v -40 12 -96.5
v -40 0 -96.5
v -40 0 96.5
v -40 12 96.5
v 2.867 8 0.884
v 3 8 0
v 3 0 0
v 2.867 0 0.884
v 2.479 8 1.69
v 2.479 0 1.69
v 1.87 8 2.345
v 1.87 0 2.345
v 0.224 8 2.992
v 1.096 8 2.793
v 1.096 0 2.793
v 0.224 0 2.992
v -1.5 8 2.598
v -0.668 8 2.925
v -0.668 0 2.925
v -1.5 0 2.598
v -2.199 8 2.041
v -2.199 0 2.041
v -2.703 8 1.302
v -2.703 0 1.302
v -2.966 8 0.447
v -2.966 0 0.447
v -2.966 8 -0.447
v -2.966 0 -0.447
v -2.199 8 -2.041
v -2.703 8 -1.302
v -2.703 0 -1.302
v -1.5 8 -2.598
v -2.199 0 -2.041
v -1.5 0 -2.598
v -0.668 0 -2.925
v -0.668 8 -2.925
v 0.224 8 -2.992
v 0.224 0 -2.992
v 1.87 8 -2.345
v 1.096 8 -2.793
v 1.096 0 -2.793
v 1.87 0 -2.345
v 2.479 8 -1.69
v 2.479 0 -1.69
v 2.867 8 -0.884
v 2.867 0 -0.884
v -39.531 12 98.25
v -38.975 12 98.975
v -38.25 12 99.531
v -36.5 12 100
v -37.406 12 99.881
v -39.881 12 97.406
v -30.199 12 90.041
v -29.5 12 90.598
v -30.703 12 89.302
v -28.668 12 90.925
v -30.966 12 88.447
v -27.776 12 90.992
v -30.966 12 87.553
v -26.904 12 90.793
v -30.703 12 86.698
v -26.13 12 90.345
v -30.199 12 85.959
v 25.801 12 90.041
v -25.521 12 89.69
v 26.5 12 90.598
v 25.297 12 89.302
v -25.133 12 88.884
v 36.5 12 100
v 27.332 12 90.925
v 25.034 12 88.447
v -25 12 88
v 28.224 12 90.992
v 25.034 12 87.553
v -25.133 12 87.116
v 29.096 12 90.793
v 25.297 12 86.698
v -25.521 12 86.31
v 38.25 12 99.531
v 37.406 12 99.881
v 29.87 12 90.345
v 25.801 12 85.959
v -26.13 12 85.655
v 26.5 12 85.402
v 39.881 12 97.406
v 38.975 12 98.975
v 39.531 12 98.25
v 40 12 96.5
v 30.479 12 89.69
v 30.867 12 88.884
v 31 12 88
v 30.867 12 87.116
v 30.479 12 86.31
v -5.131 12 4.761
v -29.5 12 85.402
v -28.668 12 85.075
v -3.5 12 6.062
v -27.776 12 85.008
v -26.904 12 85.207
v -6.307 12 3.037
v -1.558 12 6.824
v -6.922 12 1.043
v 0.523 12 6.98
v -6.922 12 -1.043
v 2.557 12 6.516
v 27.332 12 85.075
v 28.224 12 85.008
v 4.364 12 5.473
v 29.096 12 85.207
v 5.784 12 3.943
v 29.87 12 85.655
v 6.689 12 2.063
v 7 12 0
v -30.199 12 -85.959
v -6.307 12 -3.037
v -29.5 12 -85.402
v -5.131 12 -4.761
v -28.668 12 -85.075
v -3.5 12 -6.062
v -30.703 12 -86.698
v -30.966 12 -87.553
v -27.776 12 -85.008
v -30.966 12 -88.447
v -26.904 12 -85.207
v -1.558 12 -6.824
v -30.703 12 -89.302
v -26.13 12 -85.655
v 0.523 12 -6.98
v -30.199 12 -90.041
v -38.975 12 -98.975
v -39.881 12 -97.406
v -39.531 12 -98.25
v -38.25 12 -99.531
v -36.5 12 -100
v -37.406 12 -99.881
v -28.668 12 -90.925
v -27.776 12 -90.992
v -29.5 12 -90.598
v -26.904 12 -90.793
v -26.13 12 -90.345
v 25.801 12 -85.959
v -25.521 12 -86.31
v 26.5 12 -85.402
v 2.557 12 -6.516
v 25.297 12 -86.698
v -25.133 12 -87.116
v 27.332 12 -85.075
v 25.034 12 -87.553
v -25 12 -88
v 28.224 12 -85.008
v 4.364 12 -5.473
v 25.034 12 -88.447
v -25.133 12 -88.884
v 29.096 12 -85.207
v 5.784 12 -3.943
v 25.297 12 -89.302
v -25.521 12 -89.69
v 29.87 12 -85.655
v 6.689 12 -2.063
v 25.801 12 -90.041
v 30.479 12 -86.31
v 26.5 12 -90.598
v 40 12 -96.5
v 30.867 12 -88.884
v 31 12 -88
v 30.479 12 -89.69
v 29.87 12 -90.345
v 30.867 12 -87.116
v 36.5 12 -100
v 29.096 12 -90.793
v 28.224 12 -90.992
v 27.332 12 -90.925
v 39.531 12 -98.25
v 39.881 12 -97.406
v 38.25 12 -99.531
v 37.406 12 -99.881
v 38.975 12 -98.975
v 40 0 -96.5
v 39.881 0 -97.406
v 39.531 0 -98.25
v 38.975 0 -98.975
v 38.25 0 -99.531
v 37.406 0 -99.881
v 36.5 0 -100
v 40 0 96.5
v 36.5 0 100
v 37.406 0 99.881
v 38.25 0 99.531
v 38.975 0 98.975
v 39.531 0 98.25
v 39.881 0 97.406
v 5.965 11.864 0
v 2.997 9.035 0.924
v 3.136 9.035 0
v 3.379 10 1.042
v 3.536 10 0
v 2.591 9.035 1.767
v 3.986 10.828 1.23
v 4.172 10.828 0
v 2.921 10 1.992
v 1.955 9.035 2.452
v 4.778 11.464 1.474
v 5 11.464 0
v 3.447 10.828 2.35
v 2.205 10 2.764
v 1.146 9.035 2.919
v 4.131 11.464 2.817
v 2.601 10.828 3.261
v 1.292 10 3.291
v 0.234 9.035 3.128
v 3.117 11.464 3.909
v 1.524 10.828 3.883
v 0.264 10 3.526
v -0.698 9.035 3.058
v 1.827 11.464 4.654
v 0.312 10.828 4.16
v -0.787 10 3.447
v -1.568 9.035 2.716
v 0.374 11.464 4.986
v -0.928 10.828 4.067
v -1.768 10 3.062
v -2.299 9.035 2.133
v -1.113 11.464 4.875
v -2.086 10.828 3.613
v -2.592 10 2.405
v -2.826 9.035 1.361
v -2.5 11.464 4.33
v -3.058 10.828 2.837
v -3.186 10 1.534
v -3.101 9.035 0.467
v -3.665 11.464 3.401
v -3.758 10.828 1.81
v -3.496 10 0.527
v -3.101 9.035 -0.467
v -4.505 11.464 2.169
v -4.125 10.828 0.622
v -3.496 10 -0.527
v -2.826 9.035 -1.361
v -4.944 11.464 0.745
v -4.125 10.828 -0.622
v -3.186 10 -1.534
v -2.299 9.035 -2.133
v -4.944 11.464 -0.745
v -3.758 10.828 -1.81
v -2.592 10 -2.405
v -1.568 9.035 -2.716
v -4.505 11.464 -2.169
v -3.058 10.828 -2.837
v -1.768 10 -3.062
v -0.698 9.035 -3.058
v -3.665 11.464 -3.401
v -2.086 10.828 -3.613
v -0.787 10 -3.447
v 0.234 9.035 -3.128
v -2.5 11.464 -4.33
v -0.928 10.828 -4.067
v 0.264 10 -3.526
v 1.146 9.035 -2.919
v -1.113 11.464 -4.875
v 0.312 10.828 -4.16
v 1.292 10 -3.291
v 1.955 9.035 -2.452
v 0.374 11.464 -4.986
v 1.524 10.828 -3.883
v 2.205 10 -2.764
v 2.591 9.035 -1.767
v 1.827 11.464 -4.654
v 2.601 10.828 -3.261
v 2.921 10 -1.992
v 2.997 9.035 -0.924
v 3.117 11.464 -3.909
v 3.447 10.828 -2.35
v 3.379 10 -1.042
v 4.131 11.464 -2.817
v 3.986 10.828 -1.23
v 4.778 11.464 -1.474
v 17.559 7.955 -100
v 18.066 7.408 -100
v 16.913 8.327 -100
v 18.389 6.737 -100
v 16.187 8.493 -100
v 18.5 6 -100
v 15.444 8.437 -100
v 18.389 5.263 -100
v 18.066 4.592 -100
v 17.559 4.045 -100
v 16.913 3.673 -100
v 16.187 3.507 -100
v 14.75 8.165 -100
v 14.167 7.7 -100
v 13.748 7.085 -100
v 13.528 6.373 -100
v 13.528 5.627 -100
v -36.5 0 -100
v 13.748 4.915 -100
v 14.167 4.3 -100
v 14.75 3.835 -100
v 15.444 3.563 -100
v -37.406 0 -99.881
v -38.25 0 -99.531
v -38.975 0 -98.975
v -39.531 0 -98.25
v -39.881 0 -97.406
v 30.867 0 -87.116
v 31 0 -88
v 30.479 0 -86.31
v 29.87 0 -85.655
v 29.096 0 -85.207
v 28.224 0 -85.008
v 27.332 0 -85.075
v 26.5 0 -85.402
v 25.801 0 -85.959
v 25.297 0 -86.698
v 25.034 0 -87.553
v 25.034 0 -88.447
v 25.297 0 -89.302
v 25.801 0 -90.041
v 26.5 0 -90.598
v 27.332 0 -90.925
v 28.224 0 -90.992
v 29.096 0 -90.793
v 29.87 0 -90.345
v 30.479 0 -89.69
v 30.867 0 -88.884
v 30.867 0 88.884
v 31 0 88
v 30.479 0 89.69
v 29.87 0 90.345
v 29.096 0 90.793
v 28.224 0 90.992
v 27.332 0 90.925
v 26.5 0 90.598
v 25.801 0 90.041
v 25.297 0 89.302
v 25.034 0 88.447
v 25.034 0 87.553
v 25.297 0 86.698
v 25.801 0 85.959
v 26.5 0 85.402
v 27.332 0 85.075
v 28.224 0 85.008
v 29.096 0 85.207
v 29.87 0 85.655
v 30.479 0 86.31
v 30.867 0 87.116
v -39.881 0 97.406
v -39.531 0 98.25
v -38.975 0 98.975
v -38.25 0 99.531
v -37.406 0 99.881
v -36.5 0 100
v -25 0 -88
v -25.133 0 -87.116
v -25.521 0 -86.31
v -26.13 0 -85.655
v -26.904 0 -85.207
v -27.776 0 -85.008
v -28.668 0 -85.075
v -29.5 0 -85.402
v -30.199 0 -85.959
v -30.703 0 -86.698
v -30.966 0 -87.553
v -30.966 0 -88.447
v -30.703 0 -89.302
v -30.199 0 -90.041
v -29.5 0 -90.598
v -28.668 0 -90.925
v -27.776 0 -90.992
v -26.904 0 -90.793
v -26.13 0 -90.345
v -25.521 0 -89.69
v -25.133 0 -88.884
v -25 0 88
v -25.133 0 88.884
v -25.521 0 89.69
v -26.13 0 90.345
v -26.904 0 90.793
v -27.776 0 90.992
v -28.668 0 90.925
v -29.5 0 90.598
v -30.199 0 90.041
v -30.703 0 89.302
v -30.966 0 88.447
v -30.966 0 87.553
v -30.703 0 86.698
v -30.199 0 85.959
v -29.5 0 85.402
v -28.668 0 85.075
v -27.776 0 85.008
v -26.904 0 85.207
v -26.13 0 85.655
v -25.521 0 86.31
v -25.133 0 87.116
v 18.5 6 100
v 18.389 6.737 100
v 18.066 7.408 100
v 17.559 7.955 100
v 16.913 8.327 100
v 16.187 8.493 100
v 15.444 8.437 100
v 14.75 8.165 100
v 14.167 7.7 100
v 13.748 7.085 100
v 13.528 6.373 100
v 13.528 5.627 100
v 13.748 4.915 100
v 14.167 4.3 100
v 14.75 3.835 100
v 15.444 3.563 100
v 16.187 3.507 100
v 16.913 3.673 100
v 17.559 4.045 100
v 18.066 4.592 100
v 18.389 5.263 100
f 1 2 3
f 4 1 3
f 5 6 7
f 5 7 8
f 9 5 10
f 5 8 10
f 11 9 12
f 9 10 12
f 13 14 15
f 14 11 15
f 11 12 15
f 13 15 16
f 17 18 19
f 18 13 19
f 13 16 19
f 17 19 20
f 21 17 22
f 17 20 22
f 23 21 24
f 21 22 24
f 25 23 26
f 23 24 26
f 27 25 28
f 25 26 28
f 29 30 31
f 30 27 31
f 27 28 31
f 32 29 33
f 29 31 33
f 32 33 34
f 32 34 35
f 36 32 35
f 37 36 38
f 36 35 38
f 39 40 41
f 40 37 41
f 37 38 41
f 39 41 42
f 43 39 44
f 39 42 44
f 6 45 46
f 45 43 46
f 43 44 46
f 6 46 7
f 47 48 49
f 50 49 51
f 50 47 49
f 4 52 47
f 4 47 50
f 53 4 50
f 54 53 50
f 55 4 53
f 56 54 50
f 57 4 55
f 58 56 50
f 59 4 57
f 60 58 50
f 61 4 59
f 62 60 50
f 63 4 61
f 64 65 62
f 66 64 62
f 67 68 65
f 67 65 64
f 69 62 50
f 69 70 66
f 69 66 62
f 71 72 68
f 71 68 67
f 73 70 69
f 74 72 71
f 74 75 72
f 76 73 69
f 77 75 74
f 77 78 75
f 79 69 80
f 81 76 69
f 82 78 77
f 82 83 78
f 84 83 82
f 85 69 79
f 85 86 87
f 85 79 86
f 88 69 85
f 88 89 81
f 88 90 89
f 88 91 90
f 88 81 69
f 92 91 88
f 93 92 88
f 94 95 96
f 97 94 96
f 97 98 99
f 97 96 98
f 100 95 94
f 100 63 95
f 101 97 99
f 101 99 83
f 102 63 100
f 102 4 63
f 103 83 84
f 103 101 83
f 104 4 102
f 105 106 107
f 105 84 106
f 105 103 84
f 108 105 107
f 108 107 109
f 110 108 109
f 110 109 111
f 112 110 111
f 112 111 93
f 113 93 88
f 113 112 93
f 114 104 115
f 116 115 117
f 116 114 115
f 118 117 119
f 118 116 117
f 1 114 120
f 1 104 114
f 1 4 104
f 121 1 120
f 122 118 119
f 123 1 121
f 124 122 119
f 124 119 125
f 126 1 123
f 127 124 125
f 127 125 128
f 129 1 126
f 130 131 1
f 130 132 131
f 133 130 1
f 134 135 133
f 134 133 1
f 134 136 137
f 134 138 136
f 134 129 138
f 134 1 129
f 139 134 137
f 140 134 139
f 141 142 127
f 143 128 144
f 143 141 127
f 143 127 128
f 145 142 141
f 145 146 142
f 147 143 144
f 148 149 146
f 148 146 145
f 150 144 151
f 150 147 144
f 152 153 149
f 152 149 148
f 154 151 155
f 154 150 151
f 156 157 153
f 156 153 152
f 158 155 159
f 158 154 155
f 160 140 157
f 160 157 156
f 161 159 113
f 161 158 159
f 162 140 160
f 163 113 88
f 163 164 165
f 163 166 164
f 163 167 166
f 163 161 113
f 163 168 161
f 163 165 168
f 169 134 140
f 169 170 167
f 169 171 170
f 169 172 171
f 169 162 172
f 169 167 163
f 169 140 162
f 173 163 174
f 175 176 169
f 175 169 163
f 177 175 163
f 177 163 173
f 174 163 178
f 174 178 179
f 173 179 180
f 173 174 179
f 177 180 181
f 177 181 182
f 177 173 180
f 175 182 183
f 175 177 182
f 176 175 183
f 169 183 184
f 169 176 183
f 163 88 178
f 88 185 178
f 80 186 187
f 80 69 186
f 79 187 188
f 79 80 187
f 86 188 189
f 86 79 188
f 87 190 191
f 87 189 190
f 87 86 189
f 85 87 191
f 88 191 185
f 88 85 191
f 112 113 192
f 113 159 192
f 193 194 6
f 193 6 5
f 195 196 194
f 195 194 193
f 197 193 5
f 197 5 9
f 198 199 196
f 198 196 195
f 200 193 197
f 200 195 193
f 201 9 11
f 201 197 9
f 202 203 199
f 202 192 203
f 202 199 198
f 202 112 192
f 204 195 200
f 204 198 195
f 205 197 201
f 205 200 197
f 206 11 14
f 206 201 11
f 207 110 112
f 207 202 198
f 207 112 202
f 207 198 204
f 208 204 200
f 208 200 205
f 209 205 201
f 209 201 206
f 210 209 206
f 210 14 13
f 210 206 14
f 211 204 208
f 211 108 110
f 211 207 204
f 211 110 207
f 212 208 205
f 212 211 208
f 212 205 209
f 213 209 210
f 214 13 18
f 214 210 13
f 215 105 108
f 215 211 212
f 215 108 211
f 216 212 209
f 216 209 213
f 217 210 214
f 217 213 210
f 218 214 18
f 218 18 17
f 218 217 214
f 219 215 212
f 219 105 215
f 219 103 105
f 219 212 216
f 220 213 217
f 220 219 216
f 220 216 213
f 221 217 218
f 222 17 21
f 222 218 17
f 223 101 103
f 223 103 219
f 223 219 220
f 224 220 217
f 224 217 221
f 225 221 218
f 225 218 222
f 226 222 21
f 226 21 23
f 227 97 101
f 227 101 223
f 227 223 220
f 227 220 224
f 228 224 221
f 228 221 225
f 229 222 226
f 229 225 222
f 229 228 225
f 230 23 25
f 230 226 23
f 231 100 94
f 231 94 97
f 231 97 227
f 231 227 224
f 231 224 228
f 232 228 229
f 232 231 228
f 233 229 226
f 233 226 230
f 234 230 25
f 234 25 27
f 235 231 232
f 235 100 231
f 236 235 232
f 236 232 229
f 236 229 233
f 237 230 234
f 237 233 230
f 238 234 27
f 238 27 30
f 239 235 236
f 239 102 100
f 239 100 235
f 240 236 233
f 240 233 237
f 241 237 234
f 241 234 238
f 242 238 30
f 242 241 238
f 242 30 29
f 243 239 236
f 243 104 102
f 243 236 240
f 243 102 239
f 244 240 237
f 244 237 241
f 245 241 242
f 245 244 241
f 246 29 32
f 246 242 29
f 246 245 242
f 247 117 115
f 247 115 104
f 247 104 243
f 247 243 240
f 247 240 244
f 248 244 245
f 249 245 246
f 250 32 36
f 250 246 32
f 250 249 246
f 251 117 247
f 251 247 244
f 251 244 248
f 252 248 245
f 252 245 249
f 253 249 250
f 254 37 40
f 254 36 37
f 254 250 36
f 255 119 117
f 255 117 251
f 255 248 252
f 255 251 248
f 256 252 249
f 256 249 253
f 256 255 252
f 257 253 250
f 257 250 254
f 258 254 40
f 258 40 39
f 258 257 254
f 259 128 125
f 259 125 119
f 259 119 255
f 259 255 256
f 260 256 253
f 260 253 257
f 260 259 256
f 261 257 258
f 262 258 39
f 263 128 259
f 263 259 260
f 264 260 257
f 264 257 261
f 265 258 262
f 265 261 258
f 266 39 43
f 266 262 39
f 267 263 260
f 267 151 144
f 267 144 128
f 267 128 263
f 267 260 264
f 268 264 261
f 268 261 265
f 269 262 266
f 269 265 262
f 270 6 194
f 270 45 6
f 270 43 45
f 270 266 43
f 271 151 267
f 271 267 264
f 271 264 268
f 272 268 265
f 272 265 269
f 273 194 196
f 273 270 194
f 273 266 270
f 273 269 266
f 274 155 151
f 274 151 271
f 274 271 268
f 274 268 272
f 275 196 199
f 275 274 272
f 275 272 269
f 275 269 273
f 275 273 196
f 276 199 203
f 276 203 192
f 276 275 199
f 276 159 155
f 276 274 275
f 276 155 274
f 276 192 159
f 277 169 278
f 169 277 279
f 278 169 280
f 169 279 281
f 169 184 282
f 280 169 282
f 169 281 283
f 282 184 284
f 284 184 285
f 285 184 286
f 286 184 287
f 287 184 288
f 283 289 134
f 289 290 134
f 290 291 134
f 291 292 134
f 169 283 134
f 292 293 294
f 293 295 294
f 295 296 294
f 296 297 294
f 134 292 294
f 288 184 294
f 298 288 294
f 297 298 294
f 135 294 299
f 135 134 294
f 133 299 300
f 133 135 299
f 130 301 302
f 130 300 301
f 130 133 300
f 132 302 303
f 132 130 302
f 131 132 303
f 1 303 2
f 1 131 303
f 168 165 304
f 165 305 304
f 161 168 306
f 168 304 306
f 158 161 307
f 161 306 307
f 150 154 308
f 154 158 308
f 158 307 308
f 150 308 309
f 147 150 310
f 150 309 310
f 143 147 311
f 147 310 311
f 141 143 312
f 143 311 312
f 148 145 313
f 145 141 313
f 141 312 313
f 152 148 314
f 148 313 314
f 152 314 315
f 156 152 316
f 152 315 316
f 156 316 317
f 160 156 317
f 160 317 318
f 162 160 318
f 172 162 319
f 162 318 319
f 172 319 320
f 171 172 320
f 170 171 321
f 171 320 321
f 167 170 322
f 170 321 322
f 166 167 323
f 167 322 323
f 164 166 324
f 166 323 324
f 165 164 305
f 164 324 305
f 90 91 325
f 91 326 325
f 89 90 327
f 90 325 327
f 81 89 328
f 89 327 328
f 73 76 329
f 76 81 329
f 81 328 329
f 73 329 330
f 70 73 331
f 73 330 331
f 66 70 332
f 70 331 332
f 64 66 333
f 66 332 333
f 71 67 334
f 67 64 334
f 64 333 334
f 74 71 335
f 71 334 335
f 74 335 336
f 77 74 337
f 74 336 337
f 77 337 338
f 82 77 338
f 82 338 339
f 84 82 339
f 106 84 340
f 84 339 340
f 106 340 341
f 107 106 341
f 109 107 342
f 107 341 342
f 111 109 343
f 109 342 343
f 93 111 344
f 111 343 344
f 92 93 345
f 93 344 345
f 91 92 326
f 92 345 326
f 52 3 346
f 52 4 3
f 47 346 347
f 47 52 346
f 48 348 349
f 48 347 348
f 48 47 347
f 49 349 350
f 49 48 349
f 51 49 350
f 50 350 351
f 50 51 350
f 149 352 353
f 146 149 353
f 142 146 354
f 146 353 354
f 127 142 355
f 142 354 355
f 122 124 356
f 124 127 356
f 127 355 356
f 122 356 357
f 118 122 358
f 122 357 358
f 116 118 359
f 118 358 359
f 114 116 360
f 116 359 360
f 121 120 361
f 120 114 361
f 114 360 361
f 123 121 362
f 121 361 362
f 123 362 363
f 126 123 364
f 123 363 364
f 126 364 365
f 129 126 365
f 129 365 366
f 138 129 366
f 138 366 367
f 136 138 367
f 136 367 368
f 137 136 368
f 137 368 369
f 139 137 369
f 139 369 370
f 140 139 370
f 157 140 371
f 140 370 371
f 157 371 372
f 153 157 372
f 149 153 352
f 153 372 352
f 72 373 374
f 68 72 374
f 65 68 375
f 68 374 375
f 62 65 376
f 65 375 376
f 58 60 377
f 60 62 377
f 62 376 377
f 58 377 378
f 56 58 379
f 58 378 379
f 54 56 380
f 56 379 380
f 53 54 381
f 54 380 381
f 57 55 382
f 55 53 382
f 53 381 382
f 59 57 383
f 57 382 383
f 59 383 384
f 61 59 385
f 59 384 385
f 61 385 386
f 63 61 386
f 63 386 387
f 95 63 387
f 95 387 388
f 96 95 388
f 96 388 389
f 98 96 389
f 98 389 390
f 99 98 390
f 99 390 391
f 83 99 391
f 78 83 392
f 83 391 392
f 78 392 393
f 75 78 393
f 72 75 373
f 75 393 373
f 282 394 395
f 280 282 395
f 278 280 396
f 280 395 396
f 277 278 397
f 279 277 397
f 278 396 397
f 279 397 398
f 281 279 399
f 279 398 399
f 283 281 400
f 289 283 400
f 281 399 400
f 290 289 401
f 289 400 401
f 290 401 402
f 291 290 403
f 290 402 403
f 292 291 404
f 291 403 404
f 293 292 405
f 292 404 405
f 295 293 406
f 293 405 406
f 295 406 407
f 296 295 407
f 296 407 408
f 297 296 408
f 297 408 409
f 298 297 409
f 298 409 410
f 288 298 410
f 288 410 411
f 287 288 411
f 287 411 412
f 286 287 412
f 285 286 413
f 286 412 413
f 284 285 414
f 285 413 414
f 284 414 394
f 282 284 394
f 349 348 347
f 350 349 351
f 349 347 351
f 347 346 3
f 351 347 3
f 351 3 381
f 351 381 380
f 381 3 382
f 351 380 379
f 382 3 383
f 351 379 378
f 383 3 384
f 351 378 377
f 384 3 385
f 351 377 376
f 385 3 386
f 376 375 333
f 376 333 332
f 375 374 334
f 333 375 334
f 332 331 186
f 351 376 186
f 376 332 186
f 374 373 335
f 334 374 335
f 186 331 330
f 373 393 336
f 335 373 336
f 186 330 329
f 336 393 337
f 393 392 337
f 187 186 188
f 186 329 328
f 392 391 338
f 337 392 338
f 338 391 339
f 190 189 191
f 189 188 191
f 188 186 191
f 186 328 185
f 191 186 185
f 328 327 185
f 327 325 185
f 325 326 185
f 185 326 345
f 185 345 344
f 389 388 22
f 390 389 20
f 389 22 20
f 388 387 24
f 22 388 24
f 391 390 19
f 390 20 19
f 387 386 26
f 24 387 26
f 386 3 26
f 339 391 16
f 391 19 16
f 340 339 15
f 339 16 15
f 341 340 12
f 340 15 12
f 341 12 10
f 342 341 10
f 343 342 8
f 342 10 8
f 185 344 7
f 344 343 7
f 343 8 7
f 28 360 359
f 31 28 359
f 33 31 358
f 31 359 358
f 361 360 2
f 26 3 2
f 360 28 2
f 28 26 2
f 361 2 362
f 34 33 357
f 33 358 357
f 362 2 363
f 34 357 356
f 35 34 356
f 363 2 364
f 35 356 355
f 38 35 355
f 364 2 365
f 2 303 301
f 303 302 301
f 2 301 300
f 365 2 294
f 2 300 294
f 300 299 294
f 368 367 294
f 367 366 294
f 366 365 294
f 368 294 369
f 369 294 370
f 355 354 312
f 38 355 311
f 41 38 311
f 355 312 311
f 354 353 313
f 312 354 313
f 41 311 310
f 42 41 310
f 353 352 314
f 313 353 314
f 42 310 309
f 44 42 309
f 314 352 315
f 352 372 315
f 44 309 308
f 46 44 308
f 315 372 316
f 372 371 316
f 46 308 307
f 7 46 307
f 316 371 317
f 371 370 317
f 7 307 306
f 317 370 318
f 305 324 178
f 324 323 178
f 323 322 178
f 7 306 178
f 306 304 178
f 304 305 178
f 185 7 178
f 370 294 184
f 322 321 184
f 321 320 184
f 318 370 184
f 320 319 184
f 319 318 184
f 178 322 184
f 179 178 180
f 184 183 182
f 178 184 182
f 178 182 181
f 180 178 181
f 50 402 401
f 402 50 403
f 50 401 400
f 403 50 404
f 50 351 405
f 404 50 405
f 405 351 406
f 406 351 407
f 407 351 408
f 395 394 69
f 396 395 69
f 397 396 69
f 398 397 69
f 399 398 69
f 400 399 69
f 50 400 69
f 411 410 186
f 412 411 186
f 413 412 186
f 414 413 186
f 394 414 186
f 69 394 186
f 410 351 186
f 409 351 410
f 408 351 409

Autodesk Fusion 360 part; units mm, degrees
sketch "Sketch1" plane through (0, 0, 0) normal (0, 1, 0) x (1, 0, 0)
  line L0 (0, 130) -> (0, -122.2085) construction
  line L1 (-100, 0) -> (125, 0) construction
  line L2 (40, 100) -> (-40, 100)
  line L3 (-40, 100) -> (-40, -100)
  line L4 (-40, -100) -> (40, -100)
  line L5 (40, -100) -> (40, 100)
  line L6 (40, 100) -> (-40, -100) construction
  line L7 (-40, 100) -> (40, -100) construction
  circle A0 centre (-28, -88) radius 3
  circle A1 centre (0, 0) radius 3
  circle A2 centre (-28, 88) radius 3
  circle A3 centre (28, 88) radius 3
  circle A4 centre (28, -88) radius 3
  dimension "d1" = 80
  dimension "d2" = 200
  dimension "d3" = 6
  dimension "d4" = 6
  dimension "d5" = 12
  dimension "d6" = 12
extrude "Extrude1" add sketch "Sketch1" along normal blind 12
fillet "Fillet1" radius 4 1 edges at (-2.797, 12, -1.0848)
fillet "Fillet2" radius 3.5 4 edges at (40, 6, -100) (-40, 6, -100) (-40, 6, 100) (40, 6, 100)
sketch "Sketch2" plane through (0, 0, 100) normal (0, 0, 1) x (1, 0, 0)
  line L0 (36.5, 0) -> (36.5, 12)
  line L1 (36.5, 12) -> (-36.5, 12)
  line L2 (-36.5, 12) -> (-36.5, 0)
  line L3 (-36.5, 0) -> (36.5, 0)
  line L4 (0, 12) -> (0, 0) construction
  line L5 (7, 12) -> (7, 0) construction
  line L6 (7, 12) -> (-7, 12) construction
  line L7 (25, 12) -> (31, 12) construction
  line L8 (25, 12) -> (25, 0) construction
  line L9 (25, 0) -> (7, 12) construction
  line L10 (7, 0) -> (25, 12) construction
  circle A0 centre (16, 6) radius 2.5
  dimension "d13" = 7
  dimension "d14" = 14
  dimension "d15" = 6
  dimension "d16" = 5
extrude "Extrude2" cut sketch "Sketch2" against normal blind 200 contours A0
equation "d6 = d5"
equation "d13 = d14 / 2"
